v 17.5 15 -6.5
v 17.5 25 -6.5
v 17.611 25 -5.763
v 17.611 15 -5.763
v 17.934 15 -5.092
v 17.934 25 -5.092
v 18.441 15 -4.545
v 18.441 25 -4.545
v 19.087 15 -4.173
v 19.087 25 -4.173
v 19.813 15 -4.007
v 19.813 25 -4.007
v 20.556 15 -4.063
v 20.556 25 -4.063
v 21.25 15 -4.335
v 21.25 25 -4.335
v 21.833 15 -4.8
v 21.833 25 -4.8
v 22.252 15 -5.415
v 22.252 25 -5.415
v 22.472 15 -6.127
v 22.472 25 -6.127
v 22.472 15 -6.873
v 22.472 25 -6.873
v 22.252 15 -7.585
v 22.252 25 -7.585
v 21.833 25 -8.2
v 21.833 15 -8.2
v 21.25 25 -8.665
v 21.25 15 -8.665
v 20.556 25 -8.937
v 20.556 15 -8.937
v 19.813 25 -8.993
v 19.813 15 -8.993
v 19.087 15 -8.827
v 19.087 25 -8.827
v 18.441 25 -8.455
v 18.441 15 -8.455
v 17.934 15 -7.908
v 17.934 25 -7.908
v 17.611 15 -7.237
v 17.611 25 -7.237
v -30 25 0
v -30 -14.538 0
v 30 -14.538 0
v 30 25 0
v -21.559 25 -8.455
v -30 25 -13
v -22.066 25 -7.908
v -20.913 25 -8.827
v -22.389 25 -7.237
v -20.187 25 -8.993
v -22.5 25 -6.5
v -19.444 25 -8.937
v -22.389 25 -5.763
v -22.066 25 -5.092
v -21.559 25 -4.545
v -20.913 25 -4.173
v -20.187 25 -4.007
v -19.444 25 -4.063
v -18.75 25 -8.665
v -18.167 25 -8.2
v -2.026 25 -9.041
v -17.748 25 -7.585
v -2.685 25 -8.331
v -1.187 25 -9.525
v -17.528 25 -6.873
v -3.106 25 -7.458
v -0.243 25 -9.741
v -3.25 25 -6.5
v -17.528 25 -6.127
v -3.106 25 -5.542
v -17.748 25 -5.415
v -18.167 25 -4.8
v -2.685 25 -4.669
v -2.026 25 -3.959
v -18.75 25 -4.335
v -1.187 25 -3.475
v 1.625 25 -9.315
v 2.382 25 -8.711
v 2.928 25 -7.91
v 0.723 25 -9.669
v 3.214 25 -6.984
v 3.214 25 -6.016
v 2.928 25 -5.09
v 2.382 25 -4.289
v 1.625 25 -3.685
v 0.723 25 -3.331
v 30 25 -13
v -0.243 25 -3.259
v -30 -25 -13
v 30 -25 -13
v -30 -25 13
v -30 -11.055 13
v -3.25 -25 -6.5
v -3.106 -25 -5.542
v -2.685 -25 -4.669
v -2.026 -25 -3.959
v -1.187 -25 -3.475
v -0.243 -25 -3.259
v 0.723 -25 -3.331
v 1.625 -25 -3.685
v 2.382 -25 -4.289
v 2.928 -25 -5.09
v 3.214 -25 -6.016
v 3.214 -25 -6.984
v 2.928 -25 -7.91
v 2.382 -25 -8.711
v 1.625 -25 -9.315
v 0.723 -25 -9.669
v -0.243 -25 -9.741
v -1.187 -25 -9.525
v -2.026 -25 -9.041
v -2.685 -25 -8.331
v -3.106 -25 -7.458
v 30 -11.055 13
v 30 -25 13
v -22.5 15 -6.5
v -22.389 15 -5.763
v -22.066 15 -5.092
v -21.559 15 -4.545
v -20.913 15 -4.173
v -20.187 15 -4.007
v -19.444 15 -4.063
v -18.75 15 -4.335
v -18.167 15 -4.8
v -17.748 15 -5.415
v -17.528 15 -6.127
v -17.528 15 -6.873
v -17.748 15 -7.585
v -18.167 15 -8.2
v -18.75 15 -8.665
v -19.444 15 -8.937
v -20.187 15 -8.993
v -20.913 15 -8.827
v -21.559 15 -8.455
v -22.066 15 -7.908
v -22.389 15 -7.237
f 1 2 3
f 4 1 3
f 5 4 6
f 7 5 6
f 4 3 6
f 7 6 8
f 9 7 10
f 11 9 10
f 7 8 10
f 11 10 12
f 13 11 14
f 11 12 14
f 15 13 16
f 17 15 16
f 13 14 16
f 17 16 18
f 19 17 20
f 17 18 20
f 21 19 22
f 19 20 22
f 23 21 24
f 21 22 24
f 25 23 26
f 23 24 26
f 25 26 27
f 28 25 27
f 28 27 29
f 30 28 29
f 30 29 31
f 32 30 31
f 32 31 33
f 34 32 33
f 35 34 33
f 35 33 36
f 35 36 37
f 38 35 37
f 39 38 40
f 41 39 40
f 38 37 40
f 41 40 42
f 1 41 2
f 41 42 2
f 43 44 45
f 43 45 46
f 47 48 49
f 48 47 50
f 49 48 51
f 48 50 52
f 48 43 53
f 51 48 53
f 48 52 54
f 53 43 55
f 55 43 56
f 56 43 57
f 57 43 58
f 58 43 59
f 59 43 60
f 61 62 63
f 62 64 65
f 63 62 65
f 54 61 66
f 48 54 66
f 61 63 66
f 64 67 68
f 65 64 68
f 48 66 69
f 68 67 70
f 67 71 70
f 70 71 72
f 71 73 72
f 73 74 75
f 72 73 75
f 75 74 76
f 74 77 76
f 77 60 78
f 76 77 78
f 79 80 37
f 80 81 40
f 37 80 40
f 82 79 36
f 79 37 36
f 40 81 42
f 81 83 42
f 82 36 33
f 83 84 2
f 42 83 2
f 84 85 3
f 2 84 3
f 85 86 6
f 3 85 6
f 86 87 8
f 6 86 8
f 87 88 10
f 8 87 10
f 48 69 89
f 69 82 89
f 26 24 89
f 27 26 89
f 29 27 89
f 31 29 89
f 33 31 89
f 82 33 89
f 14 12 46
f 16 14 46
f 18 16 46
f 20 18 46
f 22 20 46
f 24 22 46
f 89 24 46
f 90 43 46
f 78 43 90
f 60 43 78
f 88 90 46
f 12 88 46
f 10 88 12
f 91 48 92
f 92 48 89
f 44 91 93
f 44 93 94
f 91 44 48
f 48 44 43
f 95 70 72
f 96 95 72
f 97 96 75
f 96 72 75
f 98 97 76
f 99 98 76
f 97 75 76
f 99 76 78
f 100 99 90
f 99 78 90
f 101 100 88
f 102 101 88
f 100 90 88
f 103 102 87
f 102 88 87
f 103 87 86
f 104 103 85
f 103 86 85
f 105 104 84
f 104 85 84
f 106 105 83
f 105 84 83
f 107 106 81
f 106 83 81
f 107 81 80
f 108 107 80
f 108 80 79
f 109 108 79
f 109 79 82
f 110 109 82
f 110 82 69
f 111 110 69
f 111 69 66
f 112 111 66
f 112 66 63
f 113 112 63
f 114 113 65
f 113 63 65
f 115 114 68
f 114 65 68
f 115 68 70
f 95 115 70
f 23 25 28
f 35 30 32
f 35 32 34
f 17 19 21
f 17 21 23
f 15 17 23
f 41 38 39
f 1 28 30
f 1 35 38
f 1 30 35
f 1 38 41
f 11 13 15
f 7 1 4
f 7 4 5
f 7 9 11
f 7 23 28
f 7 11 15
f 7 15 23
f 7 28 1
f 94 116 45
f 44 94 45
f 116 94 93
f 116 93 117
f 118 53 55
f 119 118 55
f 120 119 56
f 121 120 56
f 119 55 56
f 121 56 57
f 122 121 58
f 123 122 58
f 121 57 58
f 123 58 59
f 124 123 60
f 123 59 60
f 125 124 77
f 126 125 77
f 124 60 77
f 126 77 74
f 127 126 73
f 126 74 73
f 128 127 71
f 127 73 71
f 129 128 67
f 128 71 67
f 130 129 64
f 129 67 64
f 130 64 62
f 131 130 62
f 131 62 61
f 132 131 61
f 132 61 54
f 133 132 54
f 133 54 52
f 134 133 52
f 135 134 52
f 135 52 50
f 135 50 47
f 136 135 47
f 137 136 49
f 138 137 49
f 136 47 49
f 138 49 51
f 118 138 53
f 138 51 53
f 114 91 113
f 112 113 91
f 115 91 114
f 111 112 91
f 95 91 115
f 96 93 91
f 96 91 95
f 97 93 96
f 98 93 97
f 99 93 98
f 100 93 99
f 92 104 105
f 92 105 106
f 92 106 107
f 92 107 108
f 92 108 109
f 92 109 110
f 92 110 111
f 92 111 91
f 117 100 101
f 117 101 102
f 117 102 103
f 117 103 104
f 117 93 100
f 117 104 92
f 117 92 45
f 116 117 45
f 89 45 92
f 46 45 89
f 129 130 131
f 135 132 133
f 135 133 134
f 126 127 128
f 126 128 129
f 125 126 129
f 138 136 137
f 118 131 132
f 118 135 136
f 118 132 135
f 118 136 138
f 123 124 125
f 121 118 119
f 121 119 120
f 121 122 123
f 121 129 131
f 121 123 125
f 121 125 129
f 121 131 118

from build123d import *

# Parameters (mm, degrees)
F0_W     = 60
F0_H     = 50
F1_DEPTH = 13
F3_DEPTH = 60
F4_R     = 3.25
F5_DEPTH = 50
F6_R     = 2.5
F7_DEPTH = 10


with BuildPart() as f1:
    # F0 (on Top) → F1 (new body, symmetric)
    with BuildSketch(Plane.XY):
        Rectangle(F0_W, F0_H)
    extrude(amount=F1_DEPTH, both=True)

    # F2 (on face) → F3 (cut)
    with BuildSketch(Plane.YZ.offset(30)):
        Polygon((-11.055123, 13), (-14.538462, 0), (25, 0), (25, 13), align=None)
    extrude(amount=-F3_DEPTH, mode=Mode.SUBTRACT)

    # F4 (on face) → F5 (cut)
    with BuildSketch(Plane(origin=(0, 25, 0), x_dir=(-1, 0, 0), z_dir=(0, 1, 0))):
        with Locations((0, -6.5)):
            Circle(F4_R)
    extrude(amount=-F5_DEPTH, mode=Mode.SUBTRACT)

    # F6 (on face) → F7 (cut)
    with BuildSketch(Plane(origin=(0, 25, 0), x_dir=(-1, 0, 0), z_dir=(0, 1, 0))):
        with Locations((-20, -6.5)):
            Circle(F6_R)
        with Locations((20, -6.5)):
            Circle(F6_R)
    extrude(amount=-F7_DEPTH, mode=Mode.SUBTRACT)


solid = f1.part
